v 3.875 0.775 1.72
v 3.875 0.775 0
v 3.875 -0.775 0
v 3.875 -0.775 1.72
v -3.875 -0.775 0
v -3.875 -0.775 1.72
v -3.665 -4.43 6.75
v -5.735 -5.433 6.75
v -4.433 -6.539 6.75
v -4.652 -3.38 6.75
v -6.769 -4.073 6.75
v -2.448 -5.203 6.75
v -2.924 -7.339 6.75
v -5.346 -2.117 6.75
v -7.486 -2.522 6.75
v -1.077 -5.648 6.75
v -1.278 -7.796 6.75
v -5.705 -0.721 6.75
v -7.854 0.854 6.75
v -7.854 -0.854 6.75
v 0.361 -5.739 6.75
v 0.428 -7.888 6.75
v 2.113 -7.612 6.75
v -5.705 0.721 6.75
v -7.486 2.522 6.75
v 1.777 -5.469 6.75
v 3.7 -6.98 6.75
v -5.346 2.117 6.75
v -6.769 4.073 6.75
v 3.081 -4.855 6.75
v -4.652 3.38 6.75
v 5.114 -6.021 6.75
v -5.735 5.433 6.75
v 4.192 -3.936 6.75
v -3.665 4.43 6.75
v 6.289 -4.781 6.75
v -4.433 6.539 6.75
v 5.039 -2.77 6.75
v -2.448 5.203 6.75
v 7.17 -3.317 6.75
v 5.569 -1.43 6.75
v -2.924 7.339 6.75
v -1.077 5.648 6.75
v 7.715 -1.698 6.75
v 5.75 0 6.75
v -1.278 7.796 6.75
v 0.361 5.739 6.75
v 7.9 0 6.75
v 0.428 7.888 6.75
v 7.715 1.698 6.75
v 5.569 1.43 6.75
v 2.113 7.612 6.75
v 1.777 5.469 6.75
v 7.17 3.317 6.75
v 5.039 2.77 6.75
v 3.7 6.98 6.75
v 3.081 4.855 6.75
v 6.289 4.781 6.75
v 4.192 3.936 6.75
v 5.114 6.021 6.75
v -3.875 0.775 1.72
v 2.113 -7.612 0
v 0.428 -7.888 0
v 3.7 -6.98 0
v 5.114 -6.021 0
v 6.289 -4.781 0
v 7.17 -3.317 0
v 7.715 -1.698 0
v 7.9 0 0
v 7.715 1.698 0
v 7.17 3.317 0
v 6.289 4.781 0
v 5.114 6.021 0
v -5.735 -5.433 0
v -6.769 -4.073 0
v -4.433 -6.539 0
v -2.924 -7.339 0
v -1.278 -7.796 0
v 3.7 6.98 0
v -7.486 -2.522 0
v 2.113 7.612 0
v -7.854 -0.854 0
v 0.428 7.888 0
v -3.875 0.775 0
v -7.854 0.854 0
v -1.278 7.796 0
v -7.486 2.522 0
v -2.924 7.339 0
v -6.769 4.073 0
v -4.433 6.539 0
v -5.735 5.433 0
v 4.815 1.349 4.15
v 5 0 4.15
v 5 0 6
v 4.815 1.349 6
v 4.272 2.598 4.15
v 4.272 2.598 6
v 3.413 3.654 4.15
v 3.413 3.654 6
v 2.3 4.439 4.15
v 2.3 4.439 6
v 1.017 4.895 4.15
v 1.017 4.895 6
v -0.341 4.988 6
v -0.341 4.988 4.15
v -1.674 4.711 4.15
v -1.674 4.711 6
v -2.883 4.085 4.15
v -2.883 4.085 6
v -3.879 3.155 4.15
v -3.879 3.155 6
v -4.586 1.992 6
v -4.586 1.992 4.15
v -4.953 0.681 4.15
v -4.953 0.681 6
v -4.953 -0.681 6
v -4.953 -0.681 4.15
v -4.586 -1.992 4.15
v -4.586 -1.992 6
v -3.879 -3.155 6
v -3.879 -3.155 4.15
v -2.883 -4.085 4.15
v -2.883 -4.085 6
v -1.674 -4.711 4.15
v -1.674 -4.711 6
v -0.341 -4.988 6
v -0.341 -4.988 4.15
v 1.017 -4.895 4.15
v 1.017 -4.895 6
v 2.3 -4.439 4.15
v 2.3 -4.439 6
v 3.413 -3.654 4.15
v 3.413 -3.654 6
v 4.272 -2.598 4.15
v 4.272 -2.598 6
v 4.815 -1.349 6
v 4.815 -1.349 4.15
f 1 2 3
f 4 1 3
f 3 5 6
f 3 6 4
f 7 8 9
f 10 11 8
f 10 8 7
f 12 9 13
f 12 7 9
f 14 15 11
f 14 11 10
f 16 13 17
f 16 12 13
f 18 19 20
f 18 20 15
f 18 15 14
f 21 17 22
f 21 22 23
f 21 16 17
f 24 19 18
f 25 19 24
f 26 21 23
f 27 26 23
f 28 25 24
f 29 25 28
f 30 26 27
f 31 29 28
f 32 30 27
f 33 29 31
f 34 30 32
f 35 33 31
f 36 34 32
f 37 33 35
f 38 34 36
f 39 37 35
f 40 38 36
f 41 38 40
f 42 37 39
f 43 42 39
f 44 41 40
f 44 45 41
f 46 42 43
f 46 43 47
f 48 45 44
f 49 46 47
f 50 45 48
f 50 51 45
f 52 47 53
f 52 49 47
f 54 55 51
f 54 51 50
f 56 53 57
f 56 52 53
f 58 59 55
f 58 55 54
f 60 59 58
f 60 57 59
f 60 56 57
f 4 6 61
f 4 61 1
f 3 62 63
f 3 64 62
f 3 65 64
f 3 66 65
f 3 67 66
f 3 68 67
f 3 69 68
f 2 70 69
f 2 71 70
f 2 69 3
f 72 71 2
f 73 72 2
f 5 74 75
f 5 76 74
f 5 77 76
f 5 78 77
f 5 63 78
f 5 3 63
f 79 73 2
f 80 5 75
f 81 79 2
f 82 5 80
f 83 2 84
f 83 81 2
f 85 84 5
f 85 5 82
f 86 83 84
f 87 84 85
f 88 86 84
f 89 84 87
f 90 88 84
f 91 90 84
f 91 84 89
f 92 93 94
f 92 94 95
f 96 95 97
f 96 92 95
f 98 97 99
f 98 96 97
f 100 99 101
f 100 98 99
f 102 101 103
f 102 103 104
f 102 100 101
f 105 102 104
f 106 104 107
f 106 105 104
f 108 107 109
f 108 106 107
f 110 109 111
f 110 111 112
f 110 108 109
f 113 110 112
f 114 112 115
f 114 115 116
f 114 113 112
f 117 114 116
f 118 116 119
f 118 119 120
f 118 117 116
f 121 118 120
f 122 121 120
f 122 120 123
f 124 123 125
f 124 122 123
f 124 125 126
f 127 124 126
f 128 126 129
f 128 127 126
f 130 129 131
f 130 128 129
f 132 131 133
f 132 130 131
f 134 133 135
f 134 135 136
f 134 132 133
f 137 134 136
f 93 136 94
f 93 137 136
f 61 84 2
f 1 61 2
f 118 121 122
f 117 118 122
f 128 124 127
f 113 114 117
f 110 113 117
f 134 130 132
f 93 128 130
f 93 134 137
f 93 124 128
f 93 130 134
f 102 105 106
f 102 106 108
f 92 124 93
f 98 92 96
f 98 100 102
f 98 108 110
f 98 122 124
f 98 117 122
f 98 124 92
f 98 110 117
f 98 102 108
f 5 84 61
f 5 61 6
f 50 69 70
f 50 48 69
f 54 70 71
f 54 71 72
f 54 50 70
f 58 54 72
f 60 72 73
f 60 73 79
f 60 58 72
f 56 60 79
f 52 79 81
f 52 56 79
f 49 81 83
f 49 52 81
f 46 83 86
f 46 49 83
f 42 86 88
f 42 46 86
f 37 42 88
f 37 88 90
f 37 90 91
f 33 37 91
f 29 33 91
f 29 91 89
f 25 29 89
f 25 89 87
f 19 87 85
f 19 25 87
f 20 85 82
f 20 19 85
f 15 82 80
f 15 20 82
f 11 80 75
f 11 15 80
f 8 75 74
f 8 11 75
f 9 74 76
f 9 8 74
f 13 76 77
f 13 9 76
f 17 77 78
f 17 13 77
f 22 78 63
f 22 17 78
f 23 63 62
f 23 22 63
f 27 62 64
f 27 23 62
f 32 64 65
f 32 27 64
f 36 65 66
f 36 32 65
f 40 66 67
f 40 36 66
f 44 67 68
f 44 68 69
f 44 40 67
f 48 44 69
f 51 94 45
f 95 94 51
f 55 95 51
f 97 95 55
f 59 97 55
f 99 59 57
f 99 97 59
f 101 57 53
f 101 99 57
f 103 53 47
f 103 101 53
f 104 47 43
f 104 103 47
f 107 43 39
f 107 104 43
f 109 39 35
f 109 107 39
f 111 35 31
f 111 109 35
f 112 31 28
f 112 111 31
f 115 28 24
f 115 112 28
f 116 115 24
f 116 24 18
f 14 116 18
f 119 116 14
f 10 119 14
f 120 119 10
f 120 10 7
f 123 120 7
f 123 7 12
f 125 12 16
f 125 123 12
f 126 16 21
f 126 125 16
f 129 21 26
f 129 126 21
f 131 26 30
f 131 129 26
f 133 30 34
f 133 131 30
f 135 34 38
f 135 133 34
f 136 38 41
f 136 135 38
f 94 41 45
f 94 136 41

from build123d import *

# Parameters (mm, degrees)
F2_W     = 7.75
F2_H     = 1.55
F3_DEPTH = 1.72
F4_SIZE  = 0.75


with BuildPart() as f1:
    # F0 (on Front) → F1 (revolve)
    with BuildSketch(Plane.XZ):
        Polygon((0, 4.15), (0, 0), (5, 0), (7.9, 0), (7.9, 4.15), (7.9, 6.75), (5, 6.75), (5, 4.15), align=None)
    revolve(axis=Axis((0, 0, 2.075), (0, 0, 1)))

    # F2 (on face) → F3 (cut)
    with BuildSketch(Plane(origin=(0, 0, 0), x_dir=(1, 0, 0), z_dir=(0, 0, -1))):
        Rectangle(F2_W, F2_H)
    extrude(amount=-F3_DEPTH, mode=Mode.SUBTRACT)

    # F4
    f4_edges = [f1.edges().sort_by_distance(p)[0] for p in [
        (-5, 0, 6.75),
    ]]
    chamfer(f4_edges, length=F4_SIZE)


solid = f1.part
